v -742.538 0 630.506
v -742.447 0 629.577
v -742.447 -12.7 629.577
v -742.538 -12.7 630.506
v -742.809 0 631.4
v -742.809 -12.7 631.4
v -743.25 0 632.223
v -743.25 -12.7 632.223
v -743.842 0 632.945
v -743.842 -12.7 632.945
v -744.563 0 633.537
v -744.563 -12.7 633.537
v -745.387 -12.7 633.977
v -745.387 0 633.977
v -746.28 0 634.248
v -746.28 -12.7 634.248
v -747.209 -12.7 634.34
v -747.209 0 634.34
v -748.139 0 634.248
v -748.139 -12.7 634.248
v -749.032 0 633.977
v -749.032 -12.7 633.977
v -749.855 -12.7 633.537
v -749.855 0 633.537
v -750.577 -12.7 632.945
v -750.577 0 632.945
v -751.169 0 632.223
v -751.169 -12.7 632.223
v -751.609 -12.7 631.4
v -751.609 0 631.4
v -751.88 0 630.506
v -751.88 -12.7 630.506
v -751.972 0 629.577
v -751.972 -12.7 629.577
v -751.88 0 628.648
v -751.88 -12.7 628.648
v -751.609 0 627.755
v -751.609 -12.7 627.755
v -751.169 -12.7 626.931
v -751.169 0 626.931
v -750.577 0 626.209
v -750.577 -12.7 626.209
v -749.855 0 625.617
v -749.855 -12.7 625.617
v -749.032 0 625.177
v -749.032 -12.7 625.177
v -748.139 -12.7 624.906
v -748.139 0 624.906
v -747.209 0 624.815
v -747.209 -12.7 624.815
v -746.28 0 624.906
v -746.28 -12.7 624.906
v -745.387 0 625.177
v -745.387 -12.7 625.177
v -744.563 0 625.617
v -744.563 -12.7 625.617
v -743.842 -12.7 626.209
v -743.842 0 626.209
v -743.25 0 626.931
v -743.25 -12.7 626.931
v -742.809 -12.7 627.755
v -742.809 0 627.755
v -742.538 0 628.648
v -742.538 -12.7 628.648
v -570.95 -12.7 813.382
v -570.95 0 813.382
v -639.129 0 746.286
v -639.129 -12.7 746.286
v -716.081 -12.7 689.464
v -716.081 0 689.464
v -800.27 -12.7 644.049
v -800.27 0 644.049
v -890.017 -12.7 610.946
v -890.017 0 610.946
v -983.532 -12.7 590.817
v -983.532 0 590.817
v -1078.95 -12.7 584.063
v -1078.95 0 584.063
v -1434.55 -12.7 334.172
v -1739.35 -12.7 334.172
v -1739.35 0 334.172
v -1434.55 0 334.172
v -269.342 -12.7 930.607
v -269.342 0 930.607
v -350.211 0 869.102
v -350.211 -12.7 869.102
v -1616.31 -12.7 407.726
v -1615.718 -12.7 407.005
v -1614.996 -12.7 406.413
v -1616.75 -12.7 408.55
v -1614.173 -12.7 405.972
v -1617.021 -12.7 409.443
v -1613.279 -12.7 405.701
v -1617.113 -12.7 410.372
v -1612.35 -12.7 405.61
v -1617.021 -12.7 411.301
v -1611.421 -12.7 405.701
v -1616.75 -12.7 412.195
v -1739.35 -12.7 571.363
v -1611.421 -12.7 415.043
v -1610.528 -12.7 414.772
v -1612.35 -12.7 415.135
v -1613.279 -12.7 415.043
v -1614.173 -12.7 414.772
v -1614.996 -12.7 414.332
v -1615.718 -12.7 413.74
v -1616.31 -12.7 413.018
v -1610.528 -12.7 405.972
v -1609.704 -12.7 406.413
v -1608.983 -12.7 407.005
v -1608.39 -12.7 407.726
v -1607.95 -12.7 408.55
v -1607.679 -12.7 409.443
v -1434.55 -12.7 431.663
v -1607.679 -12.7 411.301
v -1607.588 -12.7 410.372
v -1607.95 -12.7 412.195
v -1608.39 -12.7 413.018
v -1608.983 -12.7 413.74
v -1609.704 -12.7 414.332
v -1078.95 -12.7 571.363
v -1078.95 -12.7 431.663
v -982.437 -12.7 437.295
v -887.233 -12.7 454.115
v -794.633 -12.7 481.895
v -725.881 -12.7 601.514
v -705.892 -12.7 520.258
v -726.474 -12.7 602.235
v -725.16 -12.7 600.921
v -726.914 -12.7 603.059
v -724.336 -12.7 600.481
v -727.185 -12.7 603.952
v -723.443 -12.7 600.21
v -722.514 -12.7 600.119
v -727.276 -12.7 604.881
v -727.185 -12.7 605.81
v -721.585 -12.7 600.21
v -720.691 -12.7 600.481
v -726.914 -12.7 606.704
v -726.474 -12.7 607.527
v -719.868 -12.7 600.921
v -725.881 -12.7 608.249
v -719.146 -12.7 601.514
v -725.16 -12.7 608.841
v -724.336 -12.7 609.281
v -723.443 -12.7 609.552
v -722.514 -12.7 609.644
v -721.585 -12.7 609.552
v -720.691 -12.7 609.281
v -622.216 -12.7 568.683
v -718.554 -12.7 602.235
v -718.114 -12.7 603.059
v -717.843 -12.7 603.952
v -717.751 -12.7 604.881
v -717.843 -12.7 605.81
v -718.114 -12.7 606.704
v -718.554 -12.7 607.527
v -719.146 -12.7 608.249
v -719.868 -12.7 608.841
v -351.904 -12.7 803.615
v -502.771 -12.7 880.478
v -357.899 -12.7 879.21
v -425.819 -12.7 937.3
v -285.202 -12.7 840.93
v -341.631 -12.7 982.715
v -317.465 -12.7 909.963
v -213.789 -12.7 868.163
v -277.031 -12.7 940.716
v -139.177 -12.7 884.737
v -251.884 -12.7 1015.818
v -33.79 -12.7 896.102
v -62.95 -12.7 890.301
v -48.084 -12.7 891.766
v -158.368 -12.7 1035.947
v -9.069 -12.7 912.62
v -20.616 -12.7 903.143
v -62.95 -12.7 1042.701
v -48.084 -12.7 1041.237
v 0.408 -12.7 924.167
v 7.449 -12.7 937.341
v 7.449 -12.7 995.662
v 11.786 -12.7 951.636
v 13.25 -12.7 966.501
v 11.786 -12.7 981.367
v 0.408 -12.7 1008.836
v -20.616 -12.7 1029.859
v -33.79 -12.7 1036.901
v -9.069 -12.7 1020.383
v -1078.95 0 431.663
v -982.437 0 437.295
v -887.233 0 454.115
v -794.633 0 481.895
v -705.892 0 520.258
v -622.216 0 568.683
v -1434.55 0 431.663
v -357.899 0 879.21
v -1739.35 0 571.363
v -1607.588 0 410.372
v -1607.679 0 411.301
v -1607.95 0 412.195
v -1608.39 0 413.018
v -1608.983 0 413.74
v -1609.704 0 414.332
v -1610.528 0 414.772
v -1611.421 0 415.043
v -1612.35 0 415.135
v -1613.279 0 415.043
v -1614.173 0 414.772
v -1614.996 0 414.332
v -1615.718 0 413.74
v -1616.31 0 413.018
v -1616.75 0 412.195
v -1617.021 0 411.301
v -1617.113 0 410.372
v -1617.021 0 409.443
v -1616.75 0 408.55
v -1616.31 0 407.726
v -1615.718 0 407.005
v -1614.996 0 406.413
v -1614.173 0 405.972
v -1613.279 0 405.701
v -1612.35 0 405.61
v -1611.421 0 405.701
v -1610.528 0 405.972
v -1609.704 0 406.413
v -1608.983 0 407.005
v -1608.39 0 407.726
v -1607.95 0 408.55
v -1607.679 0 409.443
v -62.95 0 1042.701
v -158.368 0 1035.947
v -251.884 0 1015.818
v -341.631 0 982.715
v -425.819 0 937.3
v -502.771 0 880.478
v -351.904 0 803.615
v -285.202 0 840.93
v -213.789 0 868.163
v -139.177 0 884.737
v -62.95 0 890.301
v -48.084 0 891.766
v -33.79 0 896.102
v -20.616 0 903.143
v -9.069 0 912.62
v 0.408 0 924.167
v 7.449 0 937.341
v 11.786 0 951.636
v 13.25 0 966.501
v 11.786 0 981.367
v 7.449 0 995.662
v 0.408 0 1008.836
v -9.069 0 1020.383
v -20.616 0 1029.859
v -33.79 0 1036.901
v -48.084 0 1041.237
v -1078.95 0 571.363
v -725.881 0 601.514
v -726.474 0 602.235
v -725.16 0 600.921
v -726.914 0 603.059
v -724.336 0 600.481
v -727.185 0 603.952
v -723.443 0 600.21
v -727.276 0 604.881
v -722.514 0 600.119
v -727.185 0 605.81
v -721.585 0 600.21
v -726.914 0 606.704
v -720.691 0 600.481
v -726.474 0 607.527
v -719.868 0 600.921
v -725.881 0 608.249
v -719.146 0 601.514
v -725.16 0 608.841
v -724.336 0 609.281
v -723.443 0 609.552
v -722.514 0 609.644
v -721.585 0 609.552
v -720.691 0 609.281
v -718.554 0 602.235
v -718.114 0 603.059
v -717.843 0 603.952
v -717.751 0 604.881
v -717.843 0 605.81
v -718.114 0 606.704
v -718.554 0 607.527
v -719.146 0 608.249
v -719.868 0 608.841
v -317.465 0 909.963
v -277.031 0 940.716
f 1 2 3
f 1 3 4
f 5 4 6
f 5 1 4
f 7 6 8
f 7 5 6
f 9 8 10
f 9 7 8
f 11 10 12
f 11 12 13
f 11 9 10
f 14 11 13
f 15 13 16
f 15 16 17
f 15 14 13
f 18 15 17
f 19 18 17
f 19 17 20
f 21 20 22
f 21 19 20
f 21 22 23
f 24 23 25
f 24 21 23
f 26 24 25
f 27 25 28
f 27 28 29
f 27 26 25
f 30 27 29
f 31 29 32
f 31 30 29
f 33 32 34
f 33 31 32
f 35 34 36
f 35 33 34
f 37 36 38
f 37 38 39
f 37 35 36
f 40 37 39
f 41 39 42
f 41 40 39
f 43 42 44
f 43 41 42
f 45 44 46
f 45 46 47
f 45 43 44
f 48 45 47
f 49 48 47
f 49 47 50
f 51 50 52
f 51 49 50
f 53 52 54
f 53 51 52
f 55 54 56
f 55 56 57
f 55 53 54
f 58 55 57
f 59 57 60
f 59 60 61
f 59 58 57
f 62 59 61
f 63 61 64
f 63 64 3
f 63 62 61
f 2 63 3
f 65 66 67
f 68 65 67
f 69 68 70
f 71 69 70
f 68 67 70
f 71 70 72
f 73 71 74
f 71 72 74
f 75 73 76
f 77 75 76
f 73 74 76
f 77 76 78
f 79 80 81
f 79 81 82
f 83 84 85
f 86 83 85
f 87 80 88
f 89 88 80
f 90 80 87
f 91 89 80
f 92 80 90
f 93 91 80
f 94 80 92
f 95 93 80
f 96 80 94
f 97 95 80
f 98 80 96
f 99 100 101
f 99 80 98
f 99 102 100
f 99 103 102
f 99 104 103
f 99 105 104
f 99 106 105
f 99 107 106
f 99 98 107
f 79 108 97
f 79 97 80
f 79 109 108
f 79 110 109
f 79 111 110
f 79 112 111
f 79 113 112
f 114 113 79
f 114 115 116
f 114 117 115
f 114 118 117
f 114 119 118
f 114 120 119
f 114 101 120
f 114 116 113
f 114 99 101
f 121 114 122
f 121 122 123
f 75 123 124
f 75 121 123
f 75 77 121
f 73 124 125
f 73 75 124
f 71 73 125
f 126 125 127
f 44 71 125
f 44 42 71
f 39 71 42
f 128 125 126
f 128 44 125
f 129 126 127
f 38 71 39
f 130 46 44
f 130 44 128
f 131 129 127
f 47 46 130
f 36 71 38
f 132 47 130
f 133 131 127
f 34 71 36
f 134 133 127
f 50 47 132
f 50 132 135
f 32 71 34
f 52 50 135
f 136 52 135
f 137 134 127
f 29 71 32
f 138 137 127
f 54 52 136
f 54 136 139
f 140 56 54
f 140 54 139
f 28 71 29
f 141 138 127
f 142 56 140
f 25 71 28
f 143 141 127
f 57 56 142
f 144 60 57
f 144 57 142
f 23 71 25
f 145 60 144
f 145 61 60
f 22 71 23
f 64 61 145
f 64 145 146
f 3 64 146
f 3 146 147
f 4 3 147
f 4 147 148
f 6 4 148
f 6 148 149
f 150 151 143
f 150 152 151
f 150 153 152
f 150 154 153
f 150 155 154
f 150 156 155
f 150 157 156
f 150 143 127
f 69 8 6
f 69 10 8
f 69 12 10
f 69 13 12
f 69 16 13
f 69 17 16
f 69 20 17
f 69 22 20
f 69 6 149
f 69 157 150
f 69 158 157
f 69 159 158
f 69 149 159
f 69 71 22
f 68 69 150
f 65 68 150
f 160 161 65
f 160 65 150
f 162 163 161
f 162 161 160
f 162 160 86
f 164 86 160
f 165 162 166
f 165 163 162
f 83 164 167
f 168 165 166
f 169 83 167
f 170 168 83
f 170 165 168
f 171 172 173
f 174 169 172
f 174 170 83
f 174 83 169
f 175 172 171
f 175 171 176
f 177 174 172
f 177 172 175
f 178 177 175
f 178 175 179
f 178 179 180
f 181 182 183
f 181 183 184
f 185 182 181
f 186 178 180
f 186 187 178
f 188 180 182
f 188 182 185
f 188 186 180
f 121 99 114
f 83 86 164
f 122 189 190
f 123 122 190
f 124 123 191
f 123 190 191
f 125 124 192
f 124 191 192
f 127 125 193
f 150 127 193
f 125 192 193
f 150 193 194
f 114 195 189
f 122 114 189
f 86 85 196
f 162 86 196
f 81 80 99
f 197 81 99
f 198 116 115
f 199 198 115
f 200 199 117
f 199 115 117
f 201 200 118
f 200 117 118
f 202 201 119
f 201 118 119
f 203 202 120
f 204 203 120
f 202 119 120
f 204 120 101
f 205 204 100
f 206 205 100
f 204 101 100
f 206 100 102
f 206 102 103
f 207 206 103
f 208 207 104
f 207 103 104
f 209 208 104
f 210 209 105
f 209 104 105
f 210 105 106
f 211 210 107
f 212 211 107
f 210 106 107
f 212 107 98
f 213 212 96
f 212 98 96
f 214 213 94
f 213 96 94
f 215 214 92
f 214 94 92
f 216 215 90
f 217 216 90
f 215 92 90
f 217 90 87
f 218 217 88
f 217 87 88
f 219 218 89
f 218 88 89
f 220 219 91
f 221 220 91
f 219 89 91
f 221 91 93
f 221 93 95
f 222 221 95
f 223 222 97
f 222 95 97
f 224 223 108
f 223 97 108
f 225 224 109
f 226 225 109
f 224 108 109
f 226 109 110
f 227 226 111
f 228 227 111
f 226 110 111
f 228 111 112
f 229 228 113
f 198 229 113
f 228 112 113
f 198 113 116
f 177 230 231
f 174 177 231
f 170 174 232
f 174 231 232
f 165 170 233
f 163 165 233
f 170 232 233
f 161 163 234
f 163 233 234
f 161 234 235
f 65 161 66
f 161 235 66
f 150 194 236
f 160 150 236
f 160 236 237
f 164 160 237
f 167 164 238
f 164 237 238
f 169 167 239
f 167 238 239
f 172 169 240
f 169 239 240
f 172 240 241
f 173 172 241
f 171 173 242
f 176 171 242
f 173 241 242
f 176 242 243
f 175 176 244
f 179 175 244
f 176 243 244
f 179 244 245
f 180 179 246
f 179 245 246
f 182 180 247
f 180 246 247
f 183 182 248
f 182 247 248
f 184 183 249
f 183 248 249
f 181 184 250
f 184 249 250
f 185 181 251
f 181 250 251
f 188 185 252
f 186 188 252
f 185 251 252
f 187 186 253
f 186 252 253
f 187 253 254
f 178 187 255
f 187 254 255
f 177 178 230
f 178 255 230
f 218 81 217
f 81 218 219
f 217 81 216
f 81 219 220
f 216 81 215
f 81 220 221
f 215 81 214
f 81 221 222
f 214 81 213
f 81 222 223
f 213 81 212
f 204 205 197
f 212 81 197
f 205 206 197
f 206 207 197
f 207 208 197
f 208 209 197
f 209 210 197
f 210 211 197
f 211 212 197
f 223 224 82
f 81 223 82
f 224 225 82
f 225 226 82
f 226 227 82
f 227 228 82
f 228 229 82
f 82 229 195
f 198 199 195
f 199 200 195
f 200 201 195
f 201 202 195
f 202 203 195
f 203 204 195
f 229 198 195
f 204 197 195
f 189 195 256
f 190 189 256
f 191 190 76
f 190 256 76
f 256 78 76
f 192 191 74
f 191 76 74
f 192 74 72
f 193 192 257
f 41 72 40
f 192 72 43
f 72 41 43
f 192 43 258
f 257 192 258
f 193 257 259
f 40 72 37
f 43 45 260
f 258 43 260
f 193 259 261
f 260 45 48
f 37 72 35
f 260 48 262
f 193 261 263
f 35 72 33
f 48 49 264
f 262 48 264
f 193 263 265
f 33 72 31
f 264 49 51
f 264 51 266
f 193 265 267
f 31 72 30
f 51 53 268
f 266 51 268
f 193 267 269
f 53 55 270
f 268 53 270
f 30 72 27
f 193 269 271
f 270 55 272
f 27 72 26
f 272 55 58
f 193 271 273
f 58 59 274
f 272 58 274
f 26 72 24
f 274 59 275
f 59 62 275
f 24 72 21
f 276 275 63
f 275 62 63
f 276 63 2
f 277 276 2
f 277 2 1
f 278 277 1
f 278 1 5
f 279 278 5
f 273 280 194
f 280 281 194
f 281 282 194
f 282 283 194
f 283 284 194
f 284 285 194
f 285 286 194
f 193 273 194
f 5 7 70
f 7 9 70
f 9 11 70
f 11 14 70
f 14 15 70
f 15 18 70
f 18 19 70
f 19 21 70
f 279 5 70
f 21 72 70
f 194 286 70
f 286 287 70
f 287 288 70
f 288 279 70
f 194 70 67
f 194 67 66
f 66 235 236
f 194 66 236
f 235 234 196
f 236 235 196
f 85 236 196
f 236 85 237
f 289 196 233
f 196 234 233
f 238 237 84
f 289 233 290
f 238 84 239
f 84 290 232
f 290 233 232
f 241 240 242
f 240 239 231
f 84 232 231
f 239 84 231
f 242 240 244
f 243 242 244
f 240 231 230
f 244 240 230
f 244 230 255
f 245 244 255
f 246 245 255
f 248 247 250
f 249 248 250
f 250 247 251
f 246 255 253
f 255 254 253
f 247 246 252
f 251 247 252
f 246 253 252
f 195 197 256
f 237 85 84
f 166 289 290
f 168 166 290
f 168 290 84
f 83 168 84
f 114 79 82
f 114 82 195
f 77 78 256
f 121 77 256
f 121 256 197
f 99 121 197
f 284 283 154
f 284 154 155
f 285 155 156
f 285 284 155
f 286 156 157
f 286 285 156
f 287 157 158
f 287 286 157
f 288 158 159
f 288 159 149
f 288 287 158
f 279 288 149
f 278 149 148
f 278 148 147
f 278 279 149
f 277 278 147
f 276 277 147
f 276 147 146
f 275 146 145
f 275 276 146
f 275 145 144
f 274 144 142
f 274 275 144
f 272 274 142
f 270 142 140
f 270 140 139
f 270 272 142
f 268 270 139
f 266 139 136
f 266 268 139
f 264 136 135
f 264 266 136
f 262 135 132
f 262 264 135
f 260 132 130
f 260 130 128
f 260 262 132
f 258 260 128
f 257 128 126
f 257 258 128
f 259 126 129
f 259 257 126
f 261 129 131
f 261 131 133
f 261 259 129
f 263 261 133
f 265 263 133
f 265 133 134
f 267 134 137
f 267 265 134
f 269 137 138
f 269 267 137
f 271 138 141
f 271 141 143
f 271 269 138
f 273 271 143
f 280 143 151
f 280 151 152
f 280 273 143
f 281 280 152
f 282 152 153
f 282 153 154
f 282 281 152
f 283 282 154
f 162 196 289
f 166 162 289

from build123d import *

# Parameters (mm, degrees)
F0_R     = 4.7625
F1_DEPTH = 12.7
F2_W     = 304.8
F2_H     = 97.490124
F2_R     = 4.7625
F3_DEPTH = 12.7


with BuildPart() as f1:
    # F0 (on Front) → F1 (new body)
    with BuildSketch(Plane.XZ):
        with BuildLine():
            ThreePointArc((-570.950153, 813.38195), (-800.269597, 644.048616), (-1078.950153, 584.062505))
            Line((-1078.950153, 584.062505), (-1078.950153, 571.362505))
            Line((-1078.950153, 571.362505), (-1739.350153, 571.362505))
            Line((-1739.350153, 571.362505), (-1739.350153, 517.387505))
            Line((-1739.350153, 517.387505), (-1739.350153, 498.337505))
            Line((-1739.350153, 498.337505), (-1739.350153, 431.662505))
            Line((-1739.350153, 431.662505), (-1078.950153, 431.662505))
            ThreePointArc((-1078.950153, 431.662505), (-840.528034, 466.655442), (-622.216208, 568.682689))
            Line((-622.216208, 568.682689), (-351.904281, 803.615156))
            ThreePointArc((-351.904281, 803.615156), (-213.788636, 868.163006), (-62.950153, 890.301394))
            ThreePointArc((-62.950153, 890.301394), (13.249847, 966.501394), (-62.950153, 1042.701394))
            ThreePointArc((-62.950153, 1042.701394), (-341.630708, 982.715283), (-570.950153, 813.38195))
        make_face()
        with Locations((-722.51368, 604.881358)):
            Circle(F0_R, mode=Mode.SUBTRACT)
        with Locations((-747.209384, 629.577062)):
            Circle(F0_R, mode=Mode.SUBTRACT)
        Polygon((-357.898706, 879.210343), (-317.464643, 909.96301), (-277.03058, 940.715678), (-269.342413, 930.607162), (-350.210539, 869.101827), align=None, mode=Mode.SUBTRACT)
    extrude(amount=F1_DEPTH)

    # F2 (on face) → F3 (join)
    with BuildSketch(Plane.XZ.offset(12.7)):
        with Locations((-1586.950153, 382.917443)):
            Rectangle(F2_W, F2_H)
        with Locations((-1612.350153, 410.372381)):
            Circle(F2_R, mode=Mode.SUBTRACT)
    extrude(amount=-F3_DEPTH)


solid = f1.part
